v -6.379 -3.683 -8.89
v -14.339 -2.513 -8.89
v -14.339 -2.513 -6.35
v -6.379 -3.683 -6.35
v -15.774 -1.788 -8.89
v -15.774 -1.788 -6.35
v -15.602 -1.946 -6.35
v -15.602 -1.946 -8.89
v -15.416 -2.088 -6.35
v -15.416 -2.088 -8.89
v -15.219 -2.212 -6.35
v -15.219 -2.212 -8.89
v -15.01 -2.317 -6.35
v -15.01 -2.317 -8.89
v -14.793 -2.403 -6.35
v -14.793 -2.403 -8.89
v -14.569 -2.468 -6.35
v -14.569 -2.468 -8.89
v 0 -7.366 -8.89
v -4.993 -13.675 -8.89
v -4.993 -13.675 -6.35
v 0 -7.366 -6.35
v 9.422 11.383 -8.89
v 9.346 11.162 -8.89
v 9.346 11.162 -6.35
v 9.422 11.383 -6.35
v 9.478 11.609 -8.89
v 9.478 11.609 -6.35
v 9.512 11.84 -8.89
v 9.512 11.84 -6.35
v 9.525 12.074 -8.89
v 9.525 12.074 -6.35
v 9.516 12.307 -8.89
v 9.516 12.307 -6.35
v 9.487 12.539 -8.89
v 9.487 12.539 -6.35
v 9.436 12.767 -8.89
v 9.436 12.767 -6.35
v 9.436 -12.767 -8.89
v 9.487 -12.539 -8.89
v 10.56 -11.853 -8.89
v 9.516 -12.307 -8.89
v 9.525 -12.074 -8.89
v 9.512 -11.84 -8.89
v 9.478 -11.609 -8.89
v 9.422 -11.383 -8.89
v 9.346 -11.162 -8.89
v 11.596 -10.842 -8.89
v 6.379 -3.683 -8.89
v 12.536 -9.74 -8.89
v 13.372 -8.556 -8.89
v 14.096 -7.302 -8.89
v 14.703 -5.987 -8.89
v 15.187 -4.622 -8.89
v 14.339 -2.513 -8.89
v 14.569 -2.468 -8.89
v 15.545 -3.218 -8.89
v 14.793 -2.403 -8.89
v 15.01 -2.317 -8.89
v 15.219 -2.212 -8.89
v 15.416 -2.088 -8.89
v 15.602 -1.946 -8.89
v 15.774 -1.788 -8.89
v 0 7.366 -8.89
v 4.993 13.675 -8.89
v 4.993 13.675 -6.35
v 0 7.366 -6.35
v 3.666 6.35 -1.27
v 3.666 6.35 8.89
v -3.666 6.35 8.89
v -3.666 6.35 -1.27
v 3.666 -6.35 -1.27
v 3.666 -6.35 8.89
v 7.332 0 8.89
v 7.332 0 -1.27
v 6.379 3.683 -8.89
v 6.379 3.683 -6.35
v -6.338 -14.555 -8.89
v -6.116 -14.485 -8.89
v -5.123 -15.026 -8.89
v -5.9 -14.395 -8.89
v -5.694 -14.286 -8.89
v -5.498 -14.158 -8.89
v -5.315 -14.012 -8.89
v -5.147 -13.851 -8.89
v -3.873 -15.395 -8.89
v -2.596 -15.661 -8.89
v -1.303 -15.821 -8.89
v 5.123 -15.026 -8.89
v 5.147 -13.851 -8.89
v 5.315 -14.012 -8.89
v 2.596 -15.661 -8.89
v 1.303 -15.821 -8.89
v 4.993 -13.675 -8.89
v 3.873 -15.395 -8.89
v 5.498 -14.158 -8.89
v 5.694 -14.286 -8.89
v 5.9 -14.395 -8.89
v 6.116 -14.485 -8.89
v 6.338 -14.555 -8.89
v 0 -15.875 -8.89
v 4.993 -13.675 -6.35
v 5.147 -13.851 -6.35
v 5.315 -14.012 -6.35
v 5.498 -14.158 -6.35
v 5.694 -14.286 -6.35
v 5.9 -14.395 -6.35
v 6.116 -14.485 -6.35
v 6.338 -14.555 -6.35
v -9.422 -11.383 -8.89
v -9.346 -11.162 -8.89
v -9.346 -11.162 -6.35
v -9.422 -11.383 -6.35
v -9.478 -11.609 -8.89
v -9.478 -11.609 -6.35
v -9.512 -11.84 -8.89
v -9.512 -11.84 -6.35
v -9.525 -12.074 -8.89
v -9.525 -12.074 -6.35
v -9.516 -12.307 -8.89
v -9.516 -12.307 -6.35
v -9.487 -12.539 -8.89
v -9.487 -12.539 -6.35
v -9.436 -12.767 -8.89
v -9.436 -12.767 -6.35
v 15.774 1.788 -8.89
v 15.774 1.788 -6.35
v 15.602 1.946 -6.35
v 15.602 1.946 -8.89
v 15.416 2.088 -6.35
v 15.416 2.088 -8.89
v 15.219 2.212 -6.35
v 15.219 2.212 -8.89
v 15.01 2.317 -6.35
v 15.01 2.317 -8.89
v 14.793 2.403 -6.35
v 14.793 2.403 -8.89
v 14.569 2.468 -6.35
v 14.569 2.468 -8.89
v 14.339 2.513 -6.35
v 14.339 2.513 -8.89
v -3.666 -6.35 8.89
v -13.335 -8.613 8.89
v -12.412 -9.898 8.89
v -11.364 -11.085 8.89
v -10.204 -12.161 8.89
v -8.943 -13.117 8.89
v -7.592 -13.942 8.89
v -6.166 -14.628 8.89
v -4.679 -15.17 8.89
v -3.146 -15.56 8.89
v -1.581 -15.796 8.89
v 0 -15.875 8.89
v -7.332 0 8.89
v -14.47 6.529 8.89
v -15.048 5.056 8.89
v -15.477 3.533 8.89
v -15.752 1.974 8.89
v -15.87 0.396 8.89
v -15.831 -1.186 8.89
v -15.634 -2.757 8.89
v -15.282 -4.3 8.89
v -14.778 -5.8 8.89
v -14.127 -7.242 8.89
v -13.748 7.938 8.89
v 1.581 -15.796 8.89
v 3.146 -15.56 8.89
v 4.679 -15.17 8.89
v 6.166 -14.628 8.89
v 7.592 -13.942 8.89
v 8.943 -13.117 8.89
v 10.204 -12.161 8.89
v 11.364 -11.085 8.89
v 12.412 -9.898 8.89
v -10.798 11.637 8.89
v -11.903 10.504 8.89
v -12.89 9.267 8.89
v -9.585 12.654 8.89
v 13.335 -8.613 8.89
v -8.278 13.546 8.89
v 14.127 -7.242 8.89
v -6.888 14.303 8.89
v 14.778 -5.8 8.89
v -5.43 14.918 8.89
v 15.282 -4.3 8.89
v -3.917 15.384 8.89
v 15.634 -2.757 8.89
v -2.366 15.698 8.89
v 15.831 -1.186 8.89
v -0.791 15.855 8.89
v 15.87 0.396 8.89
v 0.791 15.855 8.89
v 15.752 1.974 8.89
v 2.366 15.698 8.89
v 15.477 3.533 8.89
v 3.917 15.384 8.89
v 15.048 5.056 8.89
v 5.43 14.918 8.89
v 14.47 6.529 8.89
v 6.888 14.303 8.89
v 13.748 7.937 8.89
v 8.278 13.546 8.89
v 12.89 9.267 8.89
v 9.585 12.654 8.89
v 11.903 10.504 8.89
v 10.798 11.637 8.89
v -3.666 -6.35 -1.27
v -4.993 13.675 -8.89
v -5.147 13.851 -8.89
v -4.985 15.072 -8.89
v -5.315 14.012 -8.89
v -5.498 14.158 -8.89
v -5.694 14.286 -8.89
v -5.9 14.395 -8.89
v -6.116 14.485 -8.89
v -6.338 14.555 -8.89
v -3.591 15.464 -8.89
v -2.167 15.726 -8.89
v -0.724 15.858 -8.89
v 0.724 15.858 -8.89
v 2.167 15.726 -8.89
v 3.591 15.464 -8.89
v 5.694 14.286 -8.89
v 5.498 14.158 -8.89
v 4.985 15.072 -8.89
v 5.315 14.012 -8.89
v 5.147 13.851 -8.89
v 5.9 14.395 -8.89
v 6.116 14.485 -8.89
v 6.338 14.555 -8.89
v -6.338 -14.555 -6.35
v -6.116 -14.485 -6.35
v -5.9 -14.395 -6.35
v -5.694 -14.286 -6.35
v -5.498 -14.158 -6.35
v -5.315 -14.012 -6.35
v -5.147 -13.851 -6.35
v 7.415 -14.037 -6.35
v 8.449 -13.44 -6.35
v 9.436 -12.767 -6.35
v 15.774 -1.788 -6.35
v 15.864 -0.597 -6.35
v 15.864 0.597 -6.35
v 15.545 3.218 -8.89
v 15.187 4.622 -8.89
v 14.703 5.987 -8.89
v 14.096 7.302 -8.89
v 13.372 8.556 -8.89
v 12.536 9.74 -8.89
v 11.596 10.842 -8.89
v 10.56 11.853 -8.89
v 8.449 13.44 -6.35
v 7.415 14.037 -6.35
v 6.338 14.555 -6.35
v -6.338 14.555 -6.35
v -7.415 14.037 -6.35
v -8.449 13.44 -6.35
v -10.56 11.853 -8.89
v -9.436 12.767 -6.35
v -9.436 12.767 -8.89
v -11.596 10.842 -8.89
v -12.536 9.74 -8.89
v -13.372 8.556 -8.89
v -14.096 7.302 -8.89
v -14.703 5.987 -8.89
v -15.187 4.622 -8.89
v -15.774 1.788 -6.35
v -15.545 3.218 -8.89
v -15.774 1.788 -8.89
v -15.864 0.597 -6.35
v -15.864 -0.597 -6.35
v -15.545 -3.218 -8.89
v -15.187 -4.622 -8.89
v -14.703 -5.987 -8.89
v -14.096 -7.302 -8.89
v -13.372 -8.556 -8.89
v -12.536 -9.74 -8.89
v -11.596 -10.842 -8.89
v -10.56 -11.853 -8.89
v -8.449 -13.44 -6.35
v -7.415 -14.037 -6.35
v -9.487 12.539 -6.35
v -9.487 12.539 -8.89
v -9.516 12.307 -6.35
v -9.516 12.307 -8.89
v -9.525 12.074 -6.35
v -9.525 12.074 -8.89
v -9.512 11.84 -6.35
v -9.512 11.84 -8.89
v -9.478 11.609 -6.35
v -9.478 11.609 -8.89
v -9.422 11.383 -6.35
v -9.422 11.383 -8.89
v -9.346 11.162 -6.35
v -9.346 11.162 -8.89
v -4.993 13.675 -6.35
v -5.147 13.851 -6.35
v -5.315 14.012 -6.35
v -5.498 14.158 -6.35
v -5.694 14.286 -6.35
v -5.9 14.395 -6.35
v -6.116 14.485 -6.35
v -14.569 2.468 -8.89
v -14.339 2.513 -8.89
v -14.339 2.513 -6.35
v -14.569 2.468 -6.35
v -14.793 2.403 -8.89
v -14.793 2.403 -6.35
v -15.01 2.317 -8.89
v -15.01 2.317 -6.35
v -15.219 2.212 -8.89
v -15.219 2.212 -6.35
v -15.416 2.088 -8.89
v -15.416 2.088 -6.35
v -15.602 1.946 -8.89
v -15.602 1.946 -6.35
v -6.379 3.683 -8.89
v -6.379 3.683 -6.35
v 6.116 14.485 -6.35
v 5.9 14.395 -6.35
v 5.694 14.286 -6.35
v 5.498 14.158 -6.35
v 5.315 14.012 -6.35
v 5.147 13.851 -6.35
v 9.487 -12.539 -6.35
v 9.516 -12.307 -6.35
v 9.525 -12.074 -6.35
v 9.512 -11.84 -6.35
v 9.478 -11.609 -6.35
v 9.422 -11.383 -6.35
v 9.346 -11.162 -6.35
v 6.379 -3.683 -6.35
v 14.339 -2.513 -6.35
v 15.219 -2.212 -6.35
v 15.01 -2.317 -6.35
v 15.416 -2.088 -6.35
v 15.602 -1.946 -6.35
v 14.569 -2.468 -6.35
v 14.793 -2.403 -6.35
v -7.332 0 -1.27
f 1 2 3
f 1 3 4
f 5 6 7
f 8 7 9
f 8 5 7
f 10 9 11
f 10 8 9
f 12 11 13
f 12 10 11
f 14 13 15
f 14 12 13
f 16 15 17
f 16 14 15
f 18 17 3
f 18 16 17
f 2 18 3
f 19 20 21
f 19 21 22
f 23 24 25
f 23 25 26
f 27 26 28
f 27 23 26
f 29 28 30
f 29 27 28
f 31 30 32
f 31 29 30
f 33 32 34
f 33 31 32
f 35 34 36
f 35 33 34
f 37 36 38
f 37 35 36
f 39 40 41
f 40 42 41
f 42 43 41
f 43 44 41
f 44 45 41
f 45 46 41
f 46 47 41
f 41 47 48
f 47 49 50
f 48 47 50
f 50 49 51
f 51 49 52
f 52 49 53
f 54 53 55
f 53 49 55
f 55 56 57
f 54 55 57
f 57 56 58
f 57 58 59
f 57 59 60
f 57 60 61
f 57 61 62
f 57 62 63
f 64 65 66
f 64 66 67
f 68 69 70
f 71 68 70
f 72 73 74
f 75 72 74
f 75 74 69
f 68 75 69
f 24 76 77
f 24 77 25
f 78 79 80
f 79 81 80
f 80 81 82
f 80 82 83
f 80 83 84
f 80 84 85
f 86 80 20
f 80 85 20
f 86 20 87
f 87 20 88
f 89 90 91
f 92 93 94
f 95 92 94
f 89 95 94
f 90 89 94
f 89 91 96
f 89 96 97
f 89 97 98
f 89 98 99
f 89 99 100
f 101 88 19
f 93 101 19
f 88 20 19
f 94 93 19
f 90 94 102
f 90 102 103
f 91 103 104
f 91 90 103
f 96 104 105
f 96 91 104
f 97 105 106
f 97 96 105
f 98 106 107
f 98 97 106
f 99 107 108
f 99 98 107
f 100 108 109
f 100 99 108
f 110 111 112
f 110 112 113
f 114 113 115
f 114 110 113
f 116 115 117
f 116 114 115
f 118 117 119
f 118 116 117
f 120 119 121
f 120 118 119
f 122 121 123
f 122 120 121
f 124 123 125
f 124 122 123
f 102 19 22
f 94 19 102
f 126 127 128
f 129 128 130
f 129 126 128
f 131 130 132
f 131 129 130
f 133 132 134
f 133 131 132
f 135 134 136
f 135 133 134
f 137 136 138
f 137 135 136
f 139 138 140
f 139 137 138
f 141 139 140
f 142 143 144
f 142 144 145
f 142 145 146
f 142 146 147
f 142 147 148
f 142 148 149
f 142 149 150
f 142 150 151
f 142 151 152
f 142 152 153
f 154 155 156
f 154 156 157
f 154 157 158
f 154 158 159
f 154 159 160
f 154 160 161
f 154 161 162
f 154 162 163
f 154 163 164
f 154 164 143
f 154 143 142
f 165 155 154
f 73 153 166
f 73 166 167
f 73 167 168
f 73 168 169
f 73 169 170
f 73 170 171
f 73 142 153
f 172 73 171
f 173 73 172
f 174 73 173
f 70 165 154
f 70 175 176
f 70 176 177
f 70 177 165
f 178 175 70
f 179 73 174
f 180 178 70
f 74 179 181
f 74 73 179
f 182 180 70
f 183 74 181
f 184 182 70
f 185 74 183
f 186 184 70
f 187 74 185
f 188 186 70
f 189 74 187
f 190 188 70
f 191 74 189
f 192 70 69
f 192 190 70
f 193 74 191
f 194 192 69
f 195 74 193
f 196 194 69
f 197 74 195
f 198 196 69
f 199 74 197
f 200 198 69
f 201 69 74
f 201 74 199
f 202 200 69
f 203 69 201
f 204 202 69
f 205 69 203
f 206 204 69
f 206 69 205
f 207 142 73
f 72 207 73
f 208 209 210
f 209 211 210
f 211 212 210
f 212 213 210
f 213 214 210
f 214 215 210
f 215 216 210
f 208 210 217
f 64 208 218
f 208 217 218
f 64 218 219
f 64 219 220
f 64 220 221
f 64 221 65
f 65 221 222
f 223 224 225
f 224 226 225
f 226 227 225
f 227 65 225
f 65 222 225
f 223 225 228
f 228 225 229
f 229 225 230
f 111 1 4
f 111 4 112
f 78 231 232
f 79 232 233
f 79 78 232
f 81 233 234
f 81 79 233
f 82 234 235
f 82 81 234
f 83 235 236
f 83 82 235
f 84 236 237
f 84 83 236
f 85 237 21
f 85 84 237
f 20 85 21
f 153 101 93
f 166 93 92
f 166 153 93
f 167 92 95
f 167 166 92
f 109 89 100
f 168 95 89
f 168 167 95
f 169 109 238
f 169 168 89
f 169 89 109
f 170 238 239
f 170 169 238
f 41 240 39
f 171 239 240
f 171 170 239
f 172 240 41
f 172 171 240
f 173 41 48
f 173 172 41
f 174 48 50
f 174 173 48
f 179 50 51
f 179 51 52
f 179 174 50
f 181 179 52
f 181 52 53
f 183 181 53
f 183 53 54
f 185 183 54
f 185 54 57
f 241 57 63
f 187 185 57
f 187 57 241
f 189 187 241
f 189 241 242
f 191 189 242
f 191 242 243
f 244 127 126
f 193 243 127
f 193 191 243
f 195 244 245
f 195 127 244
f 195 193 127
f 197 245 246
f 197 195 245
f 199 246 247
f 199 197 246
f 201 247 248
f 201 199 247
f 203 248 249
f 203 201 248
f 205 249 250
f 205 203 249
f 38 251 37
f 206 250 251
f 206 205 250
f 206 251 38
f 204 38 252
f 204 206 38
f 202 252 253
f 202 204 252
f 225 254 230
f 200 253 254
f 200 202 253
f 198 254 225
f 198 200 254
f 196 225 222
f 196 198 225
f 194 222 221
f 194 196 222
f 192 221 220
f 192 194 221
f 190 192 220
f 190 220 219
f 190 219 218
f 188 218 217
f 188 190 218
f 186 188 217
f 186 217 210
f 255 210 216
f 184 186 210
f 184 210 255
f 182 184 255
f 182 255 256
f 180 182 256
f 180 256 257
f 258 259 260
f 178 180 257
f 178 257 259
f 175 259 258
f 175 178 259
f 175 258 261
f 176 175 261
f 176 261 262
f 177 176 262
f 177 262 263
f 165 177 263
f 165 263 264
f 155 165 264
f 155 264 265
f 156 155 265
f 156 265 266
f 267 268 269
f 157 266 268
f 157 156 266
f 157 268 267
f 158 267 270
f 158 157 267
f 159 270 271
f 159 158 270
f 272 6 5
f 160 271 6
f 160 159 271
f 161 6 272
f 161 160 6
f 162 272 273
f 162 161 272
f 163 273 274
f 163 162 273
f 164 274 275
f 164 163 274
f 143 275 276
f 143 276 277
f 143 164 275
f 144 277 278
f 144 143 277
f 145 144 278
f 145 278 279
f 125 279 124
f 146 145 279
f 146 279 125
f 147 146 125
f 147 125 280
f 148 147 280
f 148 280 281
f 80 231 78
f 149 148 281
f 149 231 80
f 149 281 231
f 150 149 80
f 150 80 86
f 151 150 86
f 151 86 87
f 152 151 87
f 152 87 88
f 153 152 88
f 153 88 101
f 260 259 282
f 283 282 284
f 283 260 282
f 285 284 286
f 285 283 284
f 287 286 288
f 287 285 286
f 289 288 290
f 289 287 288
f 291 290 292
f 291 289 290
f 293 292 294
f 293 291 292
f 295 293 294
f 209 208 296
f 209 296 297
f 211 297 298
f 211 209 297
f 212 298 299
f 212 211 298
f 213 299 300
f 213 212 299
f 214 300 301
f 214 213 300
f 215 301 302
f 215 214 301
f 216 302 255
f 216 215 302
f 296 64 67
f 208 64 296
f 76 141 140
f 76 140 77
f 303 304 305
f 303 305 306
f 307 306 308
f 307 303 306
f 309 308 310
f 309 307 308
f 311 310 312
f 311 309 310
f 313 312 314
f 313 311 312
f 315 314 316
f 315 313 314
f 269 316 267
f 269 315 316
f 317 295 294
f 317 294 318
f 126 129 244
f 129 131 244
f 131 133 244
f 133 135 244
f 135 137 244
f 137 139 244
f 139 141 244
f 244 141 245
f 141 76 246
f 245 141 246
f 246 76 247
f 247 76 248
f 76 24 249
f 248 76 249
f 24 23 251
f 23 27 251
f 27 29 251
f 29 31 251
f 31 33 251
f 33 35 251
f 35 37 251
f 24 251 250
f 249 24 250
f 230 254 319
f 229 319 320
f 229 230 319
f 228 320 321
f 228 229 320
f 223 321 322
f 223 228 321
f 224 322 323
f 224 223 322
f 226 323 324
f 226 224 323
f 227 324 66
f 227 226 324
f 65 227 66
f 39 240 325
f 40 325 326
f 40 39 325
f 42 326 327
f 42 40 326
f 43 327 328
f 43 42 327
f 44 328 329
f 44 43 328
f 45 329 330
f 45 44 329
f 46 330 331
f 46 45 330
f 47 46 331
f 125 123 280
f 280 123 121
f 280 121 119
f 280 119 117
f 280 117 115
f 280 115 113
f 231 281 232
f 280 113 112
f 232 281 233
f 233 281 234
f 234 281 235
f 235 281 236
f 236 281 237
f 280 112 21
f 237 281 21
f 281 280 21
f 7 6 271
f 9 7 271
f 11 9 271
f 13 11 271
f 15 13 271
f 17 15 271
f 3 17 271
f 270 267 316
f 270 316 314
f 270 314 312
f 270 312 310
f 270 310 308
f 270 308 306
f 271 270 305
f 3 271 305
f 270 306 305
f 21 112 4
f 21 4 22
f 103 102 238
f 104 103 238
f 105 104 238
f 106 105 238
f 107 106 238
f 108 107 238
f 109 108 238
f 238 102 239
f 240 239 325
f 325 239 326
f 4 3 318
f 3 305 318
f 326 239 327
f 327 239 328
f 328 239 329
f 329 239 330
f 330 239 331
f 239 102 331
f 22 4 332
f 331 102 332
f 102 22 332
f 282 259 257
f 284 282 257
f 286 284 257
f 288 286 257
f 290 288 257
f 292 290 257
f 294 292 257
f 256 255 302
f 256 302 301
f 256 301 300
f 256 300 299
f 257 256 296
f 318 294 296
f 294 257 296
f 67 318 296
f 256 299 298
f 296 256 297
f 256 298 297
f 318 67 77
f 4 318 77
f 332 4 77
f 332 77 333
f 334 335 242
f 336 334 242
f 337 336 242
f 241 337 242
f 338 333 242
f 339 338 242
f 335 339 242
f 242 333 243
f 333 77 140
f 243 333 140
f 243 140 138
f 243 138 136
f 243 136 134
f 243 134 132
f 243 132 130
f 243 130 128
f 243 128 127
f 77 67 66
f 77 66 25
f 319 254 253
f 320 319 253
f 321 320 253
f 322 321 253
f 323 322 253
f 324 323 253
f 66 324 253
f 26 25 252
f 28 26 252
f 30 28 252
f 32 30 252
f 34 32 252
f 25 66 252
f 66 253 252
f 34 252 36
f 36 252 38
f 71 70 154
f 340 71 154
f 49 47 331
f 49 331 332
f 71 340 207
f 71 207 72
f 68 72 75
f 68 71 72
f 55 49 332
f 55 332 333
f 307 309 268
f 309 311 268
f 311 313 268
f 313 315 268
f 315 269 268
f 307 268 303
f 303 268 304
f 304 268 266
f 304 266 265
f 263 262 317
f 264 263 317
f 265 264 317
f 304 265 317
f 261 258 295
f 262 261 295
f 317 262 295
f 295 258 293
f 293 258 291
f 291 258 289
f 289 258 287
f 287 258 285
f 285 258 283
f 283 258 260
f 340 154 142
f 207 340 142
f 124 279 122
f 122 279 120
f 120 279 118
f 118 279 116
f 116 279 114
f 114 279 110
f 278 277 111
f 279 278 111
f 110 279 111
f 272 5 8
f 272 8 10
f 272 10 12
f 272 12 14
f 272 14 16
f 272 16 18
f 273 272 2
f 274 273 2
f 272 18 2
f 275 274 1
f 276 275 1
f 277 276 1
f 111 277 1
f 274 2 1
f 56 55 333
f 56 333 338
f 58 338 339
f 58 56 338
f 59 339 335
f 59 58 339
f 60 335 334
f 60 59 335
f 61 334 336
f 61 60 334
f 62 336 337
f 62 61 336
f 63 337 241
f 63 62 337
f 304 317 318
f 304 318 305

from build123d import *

# Parameters (mm, degrees)
BOSS_EXTRUDE1_DEPTH = 8.89
CUT_EXTRUDE1_DEPTH  = 10.16
CUT_EXTRUDE2_DEPTH  = 2.54


with BuildPart() as part:
    # Sketch1 → Boss-Extrude1 (new, symmetric)
    with BuildSketch(Plane.XY):
        with BuildLine():
            ThreePointArc((0, 15.875), (-15.875, 0), (0, -15.875))
            ThreePointArc((0, -15.875), (15.875, 0), (0, 15.875))
        make_face()
    extrude(amount=BOSS_EXTRUDE1_DEPTH, both=True)

    # Sketch2 → Cut-Extrude1 (cut)
    with BuildSketch(Plane.XY.offset(8.89)):
        Polygon((7.332348419, 0), (3.666174209, 6.35), (-3.666174209, 6.35), (-7.332348419, 0), (-3.666174209, -6.35), (3.666174209, -6.35), align=None)
    extrude(amount=-CUT_EXTRUDE1_DEPTH, mode=Mode.SUBTRACT)

    # Sketch4 → Cut-Extrude2 (cut)
    with BuildSketch(Plane(origin=(0, 0, -8.89), x_dir=(-1, 0, 0), z_dir=(0, 0, -1))):
        with BuildLine():
            Line((-6.379143124, 3.683), (-9.346003624, 11.161752295))
            ThreePointArc((-9.346003624, 11.161752295), (-8.255, 14.298079416), (-4.993359226, 13.674752709))
            Line((-4.993359226, 13.674752709), (0, 7.366))
            Line((0, 7.366), (4.993359226, 13.674752709))
            ThreePointArc((4.993359226, 13.674752709), (8.255, 14.298079416), (9.346003624, 11.161752295))
            Line((9.346003624, 11.161752295), (6.379143124, 3.683))
            Line((6.379143124, 3.683), (14.33936285, 2.513000415))
            ThreePointArc((14.33936285, 2.513000415), (16.51, 0), (14.33936285, -2.513000415))
            Line((14.33936285, -2.513000415), (6.379143124, -3.683))
            Line((6.379143124, -3.683), (9.346003624, -11.161752295))
            ThreePointArc((9.346003624, -11.161752295), (8.255, -14.298079416), (4.993359226, -13.674752709))
            Line((4.993359226, -13.674752709), (0, -7.366))
            Line((0, -7.366), (-4.993359226, -13.674752709))
            ThreePointArc((-4.993359226, -13.674752709), (-8.255, -14.298079416), (-9.346003624, -11.161752295))
            Line((-9.346003624, -11.161752295), (-6.379143124, -3.683))
            Line((-6.379143124, -3.683), (-14.33936285, -2.513000415))
            ThreePointArc((-14.33936285, -2.513000415), (-16.51, 0), (-14.33936285, 2.513000415))
            Line((-14.33936285, 2.513000415), (-6.379143124, 3.683))
        make_face()
    extrude(amount=-CUT_EXTRUDE2_DEPTH, mode=Mode.SUBTRACT)


solid = part.part
